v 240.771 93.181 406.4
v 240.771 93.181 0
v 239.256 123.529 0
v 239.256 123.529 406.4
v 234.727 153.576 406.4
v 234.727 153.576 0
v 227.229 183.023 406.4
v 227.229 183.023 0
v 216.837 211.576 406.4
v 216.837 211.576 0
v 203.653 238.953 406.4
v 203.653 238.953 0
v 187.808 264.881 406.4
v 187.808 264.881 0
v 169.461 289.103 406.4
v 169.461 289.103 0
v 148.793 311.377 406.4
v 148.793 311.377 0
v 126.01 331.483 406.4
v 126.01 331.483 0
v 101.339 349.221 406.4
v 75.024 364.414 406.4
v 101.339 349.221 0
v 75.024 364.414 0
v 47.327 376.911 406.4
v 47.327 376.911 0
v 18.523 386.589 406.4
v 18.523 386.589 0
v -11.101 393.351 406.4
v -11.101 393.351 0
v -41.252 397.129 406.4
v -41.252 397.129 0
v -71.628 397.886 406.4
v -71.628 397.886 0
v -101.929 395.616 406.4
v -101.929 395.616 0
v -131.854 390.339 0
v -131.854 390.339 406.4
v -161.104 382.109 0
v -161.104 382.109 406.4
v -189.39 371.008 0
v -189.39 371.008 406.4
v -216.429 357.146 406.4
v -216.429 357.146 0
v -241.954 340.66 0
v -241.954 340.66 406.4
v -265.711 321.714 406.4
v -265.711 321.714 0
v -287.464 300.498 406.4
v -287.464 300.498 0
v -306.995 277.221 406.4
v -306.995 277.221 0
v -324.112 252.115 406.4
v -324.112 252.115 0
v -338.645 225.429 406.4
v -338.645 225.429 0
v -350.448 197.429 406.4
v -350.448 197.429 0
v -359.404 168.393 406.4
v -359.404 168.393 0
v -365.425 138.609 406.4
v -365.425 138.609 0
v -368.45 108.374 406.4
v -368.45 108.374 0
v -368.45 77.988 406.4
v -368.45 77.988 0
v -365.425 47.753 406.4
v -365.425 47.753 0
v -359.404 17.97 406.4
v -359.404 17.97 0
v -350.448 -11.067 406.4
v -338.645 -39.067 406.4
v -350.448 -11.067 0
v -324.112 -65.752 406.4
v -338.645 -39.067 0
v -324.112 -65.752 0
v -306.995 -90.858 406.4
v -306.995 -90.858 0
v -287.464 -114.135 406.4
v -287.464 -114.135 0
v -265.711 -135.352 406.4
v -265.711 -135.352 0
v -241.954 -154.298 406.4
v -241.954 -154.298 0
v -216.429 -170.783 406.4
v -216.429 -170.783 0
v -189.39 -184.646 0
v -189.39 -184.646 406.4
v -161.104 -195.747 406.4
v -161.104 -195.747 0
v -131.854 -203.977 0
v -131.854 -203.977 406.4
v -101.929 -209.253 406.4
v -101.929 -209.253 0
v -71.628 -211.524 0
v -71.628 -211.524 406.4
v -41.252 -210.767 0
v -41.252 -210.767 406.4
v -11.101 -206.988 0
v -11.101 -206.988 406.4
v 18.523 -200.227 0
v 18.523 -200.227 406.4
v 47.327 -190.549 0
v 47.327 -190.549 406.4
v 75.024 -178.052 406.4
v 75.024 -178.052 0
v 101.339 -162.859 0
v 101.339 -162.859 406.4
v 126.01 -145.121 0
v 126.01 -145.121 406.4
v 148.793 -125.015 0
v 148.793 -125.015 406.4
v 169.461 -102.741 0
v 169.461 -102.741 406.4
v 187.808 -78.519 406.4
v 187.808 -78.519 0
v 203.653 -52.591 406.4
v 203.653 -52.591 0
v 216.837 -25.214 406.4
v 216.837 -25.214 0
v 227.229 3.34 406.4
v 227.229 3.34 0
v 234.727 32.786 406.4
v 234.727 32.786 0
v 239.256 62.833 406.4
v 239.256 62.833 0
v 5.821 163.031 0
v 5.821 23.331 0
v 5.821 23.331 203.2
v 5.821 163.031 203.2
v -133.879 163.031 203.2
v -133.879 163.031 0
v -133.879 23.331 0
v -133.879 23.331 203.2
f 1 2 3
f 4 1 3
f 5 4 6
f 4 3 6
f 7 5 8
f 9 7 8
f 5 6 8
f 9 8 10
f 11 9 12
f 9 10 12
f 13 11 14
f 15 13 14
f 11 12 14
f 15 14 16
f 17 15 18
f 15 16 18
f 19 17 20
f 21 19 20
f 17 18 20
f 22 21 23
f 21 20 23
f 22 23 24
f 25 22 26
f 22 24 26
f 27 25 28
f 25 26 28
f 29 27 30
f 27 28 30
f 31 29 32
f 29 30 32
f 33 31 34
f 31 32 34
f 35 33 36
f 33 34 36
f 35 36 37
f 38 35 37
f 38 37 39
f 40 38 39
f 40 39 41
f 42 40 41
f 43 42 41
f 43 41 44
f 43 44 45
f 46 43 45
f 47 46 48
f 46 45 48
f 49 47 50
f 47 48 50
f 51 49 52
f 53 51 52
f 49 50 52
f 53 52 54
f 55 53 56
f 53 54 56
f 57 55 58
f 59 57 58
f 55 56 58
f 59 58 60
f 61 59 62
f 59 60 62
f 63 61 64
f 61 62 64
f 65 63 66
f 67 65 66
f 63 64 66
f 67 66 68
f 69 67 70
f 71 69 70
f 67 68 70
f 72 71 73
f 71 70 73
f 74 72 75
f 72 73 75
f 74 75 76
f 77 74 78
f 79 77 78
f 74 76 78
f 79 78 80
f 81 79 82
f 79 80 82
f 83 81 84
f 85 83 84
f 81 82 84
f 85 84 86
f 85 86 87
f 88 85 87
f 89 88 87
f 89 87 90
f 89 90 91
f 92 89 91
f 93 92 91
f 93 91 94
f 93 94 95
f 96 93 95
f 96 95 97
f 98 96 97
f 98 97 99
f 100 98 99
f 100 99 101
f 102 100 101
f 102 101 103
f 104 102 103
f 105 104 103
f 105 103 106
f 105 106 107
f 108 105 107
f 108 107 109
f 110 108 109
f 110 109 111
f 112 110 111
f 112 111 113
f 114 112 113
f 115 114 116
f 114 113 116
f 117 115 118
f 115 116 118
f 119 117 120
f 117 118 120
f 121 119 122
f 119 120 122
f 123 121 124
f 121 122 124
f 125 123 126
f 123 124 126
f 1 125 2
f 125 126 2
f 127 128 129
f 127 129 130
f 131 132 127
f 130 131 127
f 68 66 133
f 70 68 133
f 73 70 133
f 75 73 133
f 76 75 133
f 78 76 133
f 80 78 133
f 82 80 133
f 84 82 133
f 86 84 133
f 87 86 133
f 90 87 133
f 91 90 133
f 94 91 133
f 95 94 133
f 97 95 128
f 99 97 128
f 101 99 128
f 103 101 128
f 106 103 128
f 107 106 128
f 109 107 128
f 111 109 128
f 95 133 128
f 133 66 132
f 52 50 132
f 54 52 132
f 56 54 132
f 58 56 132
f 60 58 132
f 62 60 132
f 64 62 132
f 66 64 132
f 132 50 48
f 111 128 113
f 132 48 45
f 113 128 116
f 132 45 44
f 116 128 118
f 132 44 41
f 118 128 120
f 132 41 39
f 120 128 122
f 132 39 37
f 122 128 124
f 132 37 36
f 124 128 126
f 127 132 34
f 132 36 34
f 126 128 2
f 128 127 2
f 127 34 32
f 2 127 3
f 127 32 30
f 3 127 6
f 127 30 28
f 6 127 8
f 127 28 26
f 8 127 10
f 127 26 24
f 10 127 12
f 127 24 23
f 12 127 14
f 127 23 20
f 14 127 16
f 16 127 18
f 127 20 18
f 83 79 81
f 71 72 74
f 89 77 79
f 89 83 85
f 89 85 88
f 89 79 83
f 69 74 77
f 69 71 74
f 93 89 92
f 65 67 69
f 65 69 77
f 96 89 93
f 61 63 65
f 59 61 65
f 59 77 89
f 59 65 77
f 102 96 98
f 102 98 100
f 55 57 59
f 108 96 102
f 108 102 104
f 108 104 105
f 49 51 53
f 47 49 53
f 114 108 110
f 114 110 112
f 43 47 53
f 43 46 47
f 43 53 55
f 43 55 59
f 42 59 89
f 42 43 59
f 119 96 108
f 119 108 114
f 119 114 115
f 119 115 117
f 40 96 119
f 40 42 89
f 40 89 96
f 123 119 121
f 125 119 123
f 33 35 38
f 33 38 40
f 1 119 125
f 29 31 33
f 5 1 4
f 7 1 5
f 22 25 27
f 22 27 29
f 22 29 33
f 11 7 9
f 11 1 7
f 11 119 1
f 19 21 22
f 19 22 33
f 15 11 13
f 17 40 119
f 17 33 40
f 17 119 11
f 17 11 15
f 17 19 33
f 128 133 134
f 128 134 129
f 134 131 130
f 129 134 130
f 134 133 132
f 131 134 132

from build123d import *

# Parameters (mm, degrees)
F0_R     = 304.8
F0_W     = 139.7
F0_H     = 139.7
F1_DEPTH = 406.4
F2_W     = 139.7
F2_H     = 139.7
F3_DEPTH = 203.2


with BuildPart() as f1:
    # F0 (on Top) → F1 (new body)
    with BuildSketch(Plane.XY):
        with Locations((-64.029319, 93.181163)):
            Circle(F0_R)
        with Locations((-64.029319, 93.181163)):
            Rectangle(F0_W, F0_H, mode=Mode.SUBTRACT)
    extrude(amount=F1_DEPTH)

    # F2 (on face) → F3 (join)
    with BuildSketch(Plane.XY.offset(406.4)):
        with Locations((-64.029319, 93.181163)):
            Rectangle(F2_W, F2_H)
    extrude(amount=-F3_DEPTH)


solid = f1.part
